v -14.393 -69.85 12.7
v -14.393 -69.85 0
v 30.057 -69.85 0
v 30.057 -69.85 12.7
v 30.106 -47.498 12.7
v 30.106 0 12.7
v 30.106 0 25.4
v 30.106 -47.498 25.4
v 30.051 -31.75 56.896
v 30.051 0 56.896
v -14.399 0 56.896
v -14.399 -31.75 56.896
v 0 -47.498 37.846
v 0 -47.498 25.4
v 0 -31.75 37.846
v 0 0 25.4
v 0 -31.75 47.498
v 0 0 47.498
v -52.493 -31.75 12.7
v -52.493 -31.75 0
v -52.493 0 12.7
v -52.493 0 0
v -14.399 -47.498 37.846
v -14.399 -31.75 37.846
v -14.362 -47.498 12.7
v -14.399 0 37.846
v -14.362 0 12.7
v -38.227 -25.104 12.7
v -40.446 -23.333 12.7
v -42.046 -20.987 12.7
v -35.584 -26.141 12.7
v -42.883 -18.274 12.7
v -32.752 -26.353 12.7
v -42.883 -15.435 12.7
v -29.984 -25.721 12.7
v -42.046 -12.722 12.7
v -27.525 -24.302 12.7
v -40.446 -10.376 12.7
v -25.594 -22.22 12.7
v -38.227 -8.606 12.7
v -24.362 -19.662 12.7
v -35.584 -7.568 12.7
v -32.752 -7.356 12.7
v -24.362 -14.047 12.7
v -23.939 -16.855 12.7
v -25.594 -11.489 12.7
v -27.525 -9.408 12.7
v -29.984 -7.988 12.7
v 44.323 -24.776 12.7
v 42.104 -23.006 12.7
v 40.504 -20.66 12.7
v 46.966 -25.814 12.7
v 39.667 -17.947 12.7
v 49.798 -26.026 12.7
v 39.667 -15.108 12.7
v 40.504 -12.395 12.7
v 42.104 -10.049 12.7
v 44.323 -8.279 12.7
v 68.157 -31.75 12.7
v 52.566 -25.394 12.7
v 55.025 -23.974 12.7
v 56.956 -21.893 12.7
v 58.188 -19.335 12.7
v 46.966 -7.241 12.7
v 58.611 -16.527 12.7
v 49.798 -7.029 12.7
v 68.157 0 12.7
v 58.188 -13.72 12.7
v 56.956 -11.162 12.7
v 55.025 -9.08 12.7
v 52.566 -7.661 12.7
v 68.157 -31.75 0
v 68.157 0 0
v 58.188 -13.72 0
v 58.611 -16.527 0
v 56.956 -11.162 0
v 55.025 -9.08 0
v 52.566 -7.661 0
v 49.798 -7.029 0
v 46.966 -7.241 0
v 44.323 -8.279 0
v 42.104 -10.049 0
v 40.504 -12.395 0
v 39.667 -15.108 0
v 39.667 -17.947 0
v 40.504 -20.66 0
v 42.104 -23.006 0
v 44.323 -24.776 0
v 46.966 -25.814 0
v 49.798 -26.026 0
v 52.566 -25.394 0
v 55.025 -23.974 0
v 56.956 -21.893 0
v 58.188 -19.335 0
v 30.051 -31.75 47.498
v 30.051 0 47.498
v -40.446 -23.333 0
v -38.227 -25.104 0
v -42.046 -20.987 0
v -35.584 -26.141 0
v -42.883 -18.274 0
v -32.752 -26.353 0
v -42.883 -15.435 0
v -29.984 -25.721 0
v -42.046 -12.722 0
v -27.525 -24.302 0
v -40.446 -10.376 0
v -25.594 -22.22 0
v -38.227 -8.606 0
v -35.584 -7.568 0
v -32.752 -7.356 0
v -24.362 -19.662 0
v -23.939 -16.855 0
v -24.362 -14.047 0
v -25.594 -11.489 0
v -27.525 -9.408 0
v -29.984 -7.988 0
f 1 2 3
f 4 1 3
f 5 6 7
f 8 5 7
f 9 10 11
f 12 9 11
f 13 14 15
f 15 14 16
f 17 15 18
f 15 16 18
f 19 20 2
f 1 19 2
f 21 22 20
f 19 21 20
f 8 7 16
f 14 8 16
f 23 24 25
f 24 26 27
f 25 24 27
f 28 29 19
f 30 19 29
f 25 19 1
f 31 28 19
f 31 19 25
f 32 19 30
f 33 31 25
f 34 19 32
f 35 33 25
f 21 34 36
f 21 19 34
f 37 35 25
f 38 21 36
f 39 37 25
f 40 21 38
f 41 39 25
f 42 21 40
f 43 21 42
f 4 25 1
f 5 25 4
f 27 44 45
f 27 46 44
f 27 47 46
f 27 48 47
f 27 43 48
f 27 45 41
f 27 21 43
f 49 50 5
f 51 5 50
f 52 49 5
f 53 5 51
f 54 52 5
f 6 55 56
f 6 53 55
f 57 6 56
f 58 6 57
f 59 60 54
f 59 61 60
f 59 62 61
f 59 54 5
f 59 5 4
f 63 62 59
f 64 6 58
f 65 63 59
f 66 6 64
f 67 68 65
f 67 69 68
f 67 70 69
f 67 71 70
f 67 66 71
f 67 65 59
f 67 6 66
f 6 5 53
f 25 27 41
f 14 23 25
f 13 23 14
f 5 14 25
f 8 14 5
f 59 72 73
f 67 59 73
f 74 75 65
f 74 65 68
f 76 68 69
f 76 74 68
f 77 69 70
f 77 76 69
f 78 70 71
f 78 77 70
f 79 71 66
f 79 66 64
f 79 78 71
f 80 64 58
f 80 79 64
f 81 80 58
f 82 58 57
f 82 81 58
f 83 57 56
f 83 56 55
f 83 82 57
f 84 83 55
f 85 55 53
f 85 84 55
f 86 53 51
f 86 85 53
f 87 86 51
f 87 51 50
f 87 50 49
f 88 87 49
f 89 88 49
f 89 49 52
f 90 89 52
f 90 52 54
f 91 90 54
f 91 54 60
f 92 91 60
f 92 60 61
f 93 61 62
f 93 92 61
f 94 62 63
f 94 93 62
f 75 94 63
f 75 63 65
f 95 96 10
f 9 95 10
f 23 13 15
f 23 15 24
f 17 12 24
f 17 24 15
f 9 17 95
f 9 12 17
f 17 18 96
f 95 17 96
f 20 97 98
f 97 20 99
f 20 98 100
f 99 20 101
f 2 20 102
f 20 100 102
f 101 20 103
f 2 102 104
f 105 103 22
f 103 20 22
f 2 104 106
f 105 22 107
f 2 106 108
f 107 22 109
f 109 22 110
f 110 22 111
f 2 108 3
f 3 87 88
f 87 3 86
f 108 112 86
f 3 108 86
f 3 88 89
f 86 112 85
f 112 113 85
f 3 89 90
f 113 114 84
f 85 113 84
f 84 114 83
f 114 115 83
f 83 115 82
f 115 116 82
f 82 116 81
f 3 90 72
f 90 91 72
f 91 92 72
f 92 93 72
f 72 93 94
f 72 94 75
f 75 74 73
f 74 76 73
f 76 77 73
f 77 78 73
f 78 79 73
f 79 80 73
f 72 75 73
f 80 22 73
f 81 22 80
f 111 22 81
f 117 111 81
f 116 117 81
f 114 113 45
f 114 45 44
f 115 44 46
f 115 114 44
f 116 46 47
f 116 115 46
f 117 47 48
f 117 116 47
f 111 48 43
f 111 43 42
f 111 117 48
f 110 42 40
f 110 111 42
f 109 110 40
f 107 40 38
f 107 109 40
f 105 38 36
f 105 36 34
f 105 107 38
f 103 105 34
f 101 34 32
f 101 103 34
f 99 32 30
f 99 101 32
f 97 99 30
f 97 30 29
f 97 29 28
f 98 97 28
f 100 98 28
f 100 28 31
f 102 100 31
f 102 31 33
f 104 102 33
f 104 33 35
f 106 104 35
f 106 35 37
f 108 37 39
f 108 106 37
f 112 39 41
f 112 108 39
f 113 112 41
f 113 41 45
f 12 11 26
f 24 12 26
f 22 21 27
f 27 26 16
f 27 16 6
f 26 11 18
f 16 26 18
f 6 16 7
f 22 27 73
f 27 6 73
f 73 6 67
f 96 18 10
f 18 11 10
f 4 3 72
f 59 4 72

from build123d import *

# Parameters (mm, degrees)
F0_R     = 9.525
F1_DEPTH = 12.7
F3_DEPTH = 47.498
F4_DEPTH = 31.75


# Not quite as in the source:
# - a feature names something its author has since deleted; it is built from what else it names


with BuildPart() as f1:
    # F0 (on Top) → F1 (new body)
    with BuildSketch(Plane.XY):
        Polygon((68.1566672574, 0), (-52.4933327426, 0), (-52.4933327426, -31.75), (-14.3933327426, -69.85), (30.0566672574, -69.85), (68.1566672574, -31.75), align=None)
        with Locations((-33.4641109884, -16.8546829373)):
            Circle(F0_R, mode=Mode.SUBTRACT)
        with Locations((49.0858890116, -16.5274422616)):
            Circle(F0_R, mode=Mode.SUBTRACT)
    extrude(amount=F1_DEPTH)

    # F2 (on Front) → F3 (join)
    with BuildSketch(Plane.XZ):
        Polygon((-14.398525469, 37.846), (-14.3439900845, 0), (30.1060099155, 0), (30.1060099155, 25.4), (0, 25.4), (0, 37.846), align=None)
    extrude(amount=F3_DEPTH)

    # F2 (on Front) → F4 (join)
    with BuildSketch(Plane.XZ):
        Polygon((-14.398525469, 56.896), (-14.398525469, 37.846), (0, 37.846), (0, 47.498), (30.051474531, 47.498), (30.051474531, 56.896), align=None)
    extrude(amount=F4_DEPTH)


solid = f1.part
